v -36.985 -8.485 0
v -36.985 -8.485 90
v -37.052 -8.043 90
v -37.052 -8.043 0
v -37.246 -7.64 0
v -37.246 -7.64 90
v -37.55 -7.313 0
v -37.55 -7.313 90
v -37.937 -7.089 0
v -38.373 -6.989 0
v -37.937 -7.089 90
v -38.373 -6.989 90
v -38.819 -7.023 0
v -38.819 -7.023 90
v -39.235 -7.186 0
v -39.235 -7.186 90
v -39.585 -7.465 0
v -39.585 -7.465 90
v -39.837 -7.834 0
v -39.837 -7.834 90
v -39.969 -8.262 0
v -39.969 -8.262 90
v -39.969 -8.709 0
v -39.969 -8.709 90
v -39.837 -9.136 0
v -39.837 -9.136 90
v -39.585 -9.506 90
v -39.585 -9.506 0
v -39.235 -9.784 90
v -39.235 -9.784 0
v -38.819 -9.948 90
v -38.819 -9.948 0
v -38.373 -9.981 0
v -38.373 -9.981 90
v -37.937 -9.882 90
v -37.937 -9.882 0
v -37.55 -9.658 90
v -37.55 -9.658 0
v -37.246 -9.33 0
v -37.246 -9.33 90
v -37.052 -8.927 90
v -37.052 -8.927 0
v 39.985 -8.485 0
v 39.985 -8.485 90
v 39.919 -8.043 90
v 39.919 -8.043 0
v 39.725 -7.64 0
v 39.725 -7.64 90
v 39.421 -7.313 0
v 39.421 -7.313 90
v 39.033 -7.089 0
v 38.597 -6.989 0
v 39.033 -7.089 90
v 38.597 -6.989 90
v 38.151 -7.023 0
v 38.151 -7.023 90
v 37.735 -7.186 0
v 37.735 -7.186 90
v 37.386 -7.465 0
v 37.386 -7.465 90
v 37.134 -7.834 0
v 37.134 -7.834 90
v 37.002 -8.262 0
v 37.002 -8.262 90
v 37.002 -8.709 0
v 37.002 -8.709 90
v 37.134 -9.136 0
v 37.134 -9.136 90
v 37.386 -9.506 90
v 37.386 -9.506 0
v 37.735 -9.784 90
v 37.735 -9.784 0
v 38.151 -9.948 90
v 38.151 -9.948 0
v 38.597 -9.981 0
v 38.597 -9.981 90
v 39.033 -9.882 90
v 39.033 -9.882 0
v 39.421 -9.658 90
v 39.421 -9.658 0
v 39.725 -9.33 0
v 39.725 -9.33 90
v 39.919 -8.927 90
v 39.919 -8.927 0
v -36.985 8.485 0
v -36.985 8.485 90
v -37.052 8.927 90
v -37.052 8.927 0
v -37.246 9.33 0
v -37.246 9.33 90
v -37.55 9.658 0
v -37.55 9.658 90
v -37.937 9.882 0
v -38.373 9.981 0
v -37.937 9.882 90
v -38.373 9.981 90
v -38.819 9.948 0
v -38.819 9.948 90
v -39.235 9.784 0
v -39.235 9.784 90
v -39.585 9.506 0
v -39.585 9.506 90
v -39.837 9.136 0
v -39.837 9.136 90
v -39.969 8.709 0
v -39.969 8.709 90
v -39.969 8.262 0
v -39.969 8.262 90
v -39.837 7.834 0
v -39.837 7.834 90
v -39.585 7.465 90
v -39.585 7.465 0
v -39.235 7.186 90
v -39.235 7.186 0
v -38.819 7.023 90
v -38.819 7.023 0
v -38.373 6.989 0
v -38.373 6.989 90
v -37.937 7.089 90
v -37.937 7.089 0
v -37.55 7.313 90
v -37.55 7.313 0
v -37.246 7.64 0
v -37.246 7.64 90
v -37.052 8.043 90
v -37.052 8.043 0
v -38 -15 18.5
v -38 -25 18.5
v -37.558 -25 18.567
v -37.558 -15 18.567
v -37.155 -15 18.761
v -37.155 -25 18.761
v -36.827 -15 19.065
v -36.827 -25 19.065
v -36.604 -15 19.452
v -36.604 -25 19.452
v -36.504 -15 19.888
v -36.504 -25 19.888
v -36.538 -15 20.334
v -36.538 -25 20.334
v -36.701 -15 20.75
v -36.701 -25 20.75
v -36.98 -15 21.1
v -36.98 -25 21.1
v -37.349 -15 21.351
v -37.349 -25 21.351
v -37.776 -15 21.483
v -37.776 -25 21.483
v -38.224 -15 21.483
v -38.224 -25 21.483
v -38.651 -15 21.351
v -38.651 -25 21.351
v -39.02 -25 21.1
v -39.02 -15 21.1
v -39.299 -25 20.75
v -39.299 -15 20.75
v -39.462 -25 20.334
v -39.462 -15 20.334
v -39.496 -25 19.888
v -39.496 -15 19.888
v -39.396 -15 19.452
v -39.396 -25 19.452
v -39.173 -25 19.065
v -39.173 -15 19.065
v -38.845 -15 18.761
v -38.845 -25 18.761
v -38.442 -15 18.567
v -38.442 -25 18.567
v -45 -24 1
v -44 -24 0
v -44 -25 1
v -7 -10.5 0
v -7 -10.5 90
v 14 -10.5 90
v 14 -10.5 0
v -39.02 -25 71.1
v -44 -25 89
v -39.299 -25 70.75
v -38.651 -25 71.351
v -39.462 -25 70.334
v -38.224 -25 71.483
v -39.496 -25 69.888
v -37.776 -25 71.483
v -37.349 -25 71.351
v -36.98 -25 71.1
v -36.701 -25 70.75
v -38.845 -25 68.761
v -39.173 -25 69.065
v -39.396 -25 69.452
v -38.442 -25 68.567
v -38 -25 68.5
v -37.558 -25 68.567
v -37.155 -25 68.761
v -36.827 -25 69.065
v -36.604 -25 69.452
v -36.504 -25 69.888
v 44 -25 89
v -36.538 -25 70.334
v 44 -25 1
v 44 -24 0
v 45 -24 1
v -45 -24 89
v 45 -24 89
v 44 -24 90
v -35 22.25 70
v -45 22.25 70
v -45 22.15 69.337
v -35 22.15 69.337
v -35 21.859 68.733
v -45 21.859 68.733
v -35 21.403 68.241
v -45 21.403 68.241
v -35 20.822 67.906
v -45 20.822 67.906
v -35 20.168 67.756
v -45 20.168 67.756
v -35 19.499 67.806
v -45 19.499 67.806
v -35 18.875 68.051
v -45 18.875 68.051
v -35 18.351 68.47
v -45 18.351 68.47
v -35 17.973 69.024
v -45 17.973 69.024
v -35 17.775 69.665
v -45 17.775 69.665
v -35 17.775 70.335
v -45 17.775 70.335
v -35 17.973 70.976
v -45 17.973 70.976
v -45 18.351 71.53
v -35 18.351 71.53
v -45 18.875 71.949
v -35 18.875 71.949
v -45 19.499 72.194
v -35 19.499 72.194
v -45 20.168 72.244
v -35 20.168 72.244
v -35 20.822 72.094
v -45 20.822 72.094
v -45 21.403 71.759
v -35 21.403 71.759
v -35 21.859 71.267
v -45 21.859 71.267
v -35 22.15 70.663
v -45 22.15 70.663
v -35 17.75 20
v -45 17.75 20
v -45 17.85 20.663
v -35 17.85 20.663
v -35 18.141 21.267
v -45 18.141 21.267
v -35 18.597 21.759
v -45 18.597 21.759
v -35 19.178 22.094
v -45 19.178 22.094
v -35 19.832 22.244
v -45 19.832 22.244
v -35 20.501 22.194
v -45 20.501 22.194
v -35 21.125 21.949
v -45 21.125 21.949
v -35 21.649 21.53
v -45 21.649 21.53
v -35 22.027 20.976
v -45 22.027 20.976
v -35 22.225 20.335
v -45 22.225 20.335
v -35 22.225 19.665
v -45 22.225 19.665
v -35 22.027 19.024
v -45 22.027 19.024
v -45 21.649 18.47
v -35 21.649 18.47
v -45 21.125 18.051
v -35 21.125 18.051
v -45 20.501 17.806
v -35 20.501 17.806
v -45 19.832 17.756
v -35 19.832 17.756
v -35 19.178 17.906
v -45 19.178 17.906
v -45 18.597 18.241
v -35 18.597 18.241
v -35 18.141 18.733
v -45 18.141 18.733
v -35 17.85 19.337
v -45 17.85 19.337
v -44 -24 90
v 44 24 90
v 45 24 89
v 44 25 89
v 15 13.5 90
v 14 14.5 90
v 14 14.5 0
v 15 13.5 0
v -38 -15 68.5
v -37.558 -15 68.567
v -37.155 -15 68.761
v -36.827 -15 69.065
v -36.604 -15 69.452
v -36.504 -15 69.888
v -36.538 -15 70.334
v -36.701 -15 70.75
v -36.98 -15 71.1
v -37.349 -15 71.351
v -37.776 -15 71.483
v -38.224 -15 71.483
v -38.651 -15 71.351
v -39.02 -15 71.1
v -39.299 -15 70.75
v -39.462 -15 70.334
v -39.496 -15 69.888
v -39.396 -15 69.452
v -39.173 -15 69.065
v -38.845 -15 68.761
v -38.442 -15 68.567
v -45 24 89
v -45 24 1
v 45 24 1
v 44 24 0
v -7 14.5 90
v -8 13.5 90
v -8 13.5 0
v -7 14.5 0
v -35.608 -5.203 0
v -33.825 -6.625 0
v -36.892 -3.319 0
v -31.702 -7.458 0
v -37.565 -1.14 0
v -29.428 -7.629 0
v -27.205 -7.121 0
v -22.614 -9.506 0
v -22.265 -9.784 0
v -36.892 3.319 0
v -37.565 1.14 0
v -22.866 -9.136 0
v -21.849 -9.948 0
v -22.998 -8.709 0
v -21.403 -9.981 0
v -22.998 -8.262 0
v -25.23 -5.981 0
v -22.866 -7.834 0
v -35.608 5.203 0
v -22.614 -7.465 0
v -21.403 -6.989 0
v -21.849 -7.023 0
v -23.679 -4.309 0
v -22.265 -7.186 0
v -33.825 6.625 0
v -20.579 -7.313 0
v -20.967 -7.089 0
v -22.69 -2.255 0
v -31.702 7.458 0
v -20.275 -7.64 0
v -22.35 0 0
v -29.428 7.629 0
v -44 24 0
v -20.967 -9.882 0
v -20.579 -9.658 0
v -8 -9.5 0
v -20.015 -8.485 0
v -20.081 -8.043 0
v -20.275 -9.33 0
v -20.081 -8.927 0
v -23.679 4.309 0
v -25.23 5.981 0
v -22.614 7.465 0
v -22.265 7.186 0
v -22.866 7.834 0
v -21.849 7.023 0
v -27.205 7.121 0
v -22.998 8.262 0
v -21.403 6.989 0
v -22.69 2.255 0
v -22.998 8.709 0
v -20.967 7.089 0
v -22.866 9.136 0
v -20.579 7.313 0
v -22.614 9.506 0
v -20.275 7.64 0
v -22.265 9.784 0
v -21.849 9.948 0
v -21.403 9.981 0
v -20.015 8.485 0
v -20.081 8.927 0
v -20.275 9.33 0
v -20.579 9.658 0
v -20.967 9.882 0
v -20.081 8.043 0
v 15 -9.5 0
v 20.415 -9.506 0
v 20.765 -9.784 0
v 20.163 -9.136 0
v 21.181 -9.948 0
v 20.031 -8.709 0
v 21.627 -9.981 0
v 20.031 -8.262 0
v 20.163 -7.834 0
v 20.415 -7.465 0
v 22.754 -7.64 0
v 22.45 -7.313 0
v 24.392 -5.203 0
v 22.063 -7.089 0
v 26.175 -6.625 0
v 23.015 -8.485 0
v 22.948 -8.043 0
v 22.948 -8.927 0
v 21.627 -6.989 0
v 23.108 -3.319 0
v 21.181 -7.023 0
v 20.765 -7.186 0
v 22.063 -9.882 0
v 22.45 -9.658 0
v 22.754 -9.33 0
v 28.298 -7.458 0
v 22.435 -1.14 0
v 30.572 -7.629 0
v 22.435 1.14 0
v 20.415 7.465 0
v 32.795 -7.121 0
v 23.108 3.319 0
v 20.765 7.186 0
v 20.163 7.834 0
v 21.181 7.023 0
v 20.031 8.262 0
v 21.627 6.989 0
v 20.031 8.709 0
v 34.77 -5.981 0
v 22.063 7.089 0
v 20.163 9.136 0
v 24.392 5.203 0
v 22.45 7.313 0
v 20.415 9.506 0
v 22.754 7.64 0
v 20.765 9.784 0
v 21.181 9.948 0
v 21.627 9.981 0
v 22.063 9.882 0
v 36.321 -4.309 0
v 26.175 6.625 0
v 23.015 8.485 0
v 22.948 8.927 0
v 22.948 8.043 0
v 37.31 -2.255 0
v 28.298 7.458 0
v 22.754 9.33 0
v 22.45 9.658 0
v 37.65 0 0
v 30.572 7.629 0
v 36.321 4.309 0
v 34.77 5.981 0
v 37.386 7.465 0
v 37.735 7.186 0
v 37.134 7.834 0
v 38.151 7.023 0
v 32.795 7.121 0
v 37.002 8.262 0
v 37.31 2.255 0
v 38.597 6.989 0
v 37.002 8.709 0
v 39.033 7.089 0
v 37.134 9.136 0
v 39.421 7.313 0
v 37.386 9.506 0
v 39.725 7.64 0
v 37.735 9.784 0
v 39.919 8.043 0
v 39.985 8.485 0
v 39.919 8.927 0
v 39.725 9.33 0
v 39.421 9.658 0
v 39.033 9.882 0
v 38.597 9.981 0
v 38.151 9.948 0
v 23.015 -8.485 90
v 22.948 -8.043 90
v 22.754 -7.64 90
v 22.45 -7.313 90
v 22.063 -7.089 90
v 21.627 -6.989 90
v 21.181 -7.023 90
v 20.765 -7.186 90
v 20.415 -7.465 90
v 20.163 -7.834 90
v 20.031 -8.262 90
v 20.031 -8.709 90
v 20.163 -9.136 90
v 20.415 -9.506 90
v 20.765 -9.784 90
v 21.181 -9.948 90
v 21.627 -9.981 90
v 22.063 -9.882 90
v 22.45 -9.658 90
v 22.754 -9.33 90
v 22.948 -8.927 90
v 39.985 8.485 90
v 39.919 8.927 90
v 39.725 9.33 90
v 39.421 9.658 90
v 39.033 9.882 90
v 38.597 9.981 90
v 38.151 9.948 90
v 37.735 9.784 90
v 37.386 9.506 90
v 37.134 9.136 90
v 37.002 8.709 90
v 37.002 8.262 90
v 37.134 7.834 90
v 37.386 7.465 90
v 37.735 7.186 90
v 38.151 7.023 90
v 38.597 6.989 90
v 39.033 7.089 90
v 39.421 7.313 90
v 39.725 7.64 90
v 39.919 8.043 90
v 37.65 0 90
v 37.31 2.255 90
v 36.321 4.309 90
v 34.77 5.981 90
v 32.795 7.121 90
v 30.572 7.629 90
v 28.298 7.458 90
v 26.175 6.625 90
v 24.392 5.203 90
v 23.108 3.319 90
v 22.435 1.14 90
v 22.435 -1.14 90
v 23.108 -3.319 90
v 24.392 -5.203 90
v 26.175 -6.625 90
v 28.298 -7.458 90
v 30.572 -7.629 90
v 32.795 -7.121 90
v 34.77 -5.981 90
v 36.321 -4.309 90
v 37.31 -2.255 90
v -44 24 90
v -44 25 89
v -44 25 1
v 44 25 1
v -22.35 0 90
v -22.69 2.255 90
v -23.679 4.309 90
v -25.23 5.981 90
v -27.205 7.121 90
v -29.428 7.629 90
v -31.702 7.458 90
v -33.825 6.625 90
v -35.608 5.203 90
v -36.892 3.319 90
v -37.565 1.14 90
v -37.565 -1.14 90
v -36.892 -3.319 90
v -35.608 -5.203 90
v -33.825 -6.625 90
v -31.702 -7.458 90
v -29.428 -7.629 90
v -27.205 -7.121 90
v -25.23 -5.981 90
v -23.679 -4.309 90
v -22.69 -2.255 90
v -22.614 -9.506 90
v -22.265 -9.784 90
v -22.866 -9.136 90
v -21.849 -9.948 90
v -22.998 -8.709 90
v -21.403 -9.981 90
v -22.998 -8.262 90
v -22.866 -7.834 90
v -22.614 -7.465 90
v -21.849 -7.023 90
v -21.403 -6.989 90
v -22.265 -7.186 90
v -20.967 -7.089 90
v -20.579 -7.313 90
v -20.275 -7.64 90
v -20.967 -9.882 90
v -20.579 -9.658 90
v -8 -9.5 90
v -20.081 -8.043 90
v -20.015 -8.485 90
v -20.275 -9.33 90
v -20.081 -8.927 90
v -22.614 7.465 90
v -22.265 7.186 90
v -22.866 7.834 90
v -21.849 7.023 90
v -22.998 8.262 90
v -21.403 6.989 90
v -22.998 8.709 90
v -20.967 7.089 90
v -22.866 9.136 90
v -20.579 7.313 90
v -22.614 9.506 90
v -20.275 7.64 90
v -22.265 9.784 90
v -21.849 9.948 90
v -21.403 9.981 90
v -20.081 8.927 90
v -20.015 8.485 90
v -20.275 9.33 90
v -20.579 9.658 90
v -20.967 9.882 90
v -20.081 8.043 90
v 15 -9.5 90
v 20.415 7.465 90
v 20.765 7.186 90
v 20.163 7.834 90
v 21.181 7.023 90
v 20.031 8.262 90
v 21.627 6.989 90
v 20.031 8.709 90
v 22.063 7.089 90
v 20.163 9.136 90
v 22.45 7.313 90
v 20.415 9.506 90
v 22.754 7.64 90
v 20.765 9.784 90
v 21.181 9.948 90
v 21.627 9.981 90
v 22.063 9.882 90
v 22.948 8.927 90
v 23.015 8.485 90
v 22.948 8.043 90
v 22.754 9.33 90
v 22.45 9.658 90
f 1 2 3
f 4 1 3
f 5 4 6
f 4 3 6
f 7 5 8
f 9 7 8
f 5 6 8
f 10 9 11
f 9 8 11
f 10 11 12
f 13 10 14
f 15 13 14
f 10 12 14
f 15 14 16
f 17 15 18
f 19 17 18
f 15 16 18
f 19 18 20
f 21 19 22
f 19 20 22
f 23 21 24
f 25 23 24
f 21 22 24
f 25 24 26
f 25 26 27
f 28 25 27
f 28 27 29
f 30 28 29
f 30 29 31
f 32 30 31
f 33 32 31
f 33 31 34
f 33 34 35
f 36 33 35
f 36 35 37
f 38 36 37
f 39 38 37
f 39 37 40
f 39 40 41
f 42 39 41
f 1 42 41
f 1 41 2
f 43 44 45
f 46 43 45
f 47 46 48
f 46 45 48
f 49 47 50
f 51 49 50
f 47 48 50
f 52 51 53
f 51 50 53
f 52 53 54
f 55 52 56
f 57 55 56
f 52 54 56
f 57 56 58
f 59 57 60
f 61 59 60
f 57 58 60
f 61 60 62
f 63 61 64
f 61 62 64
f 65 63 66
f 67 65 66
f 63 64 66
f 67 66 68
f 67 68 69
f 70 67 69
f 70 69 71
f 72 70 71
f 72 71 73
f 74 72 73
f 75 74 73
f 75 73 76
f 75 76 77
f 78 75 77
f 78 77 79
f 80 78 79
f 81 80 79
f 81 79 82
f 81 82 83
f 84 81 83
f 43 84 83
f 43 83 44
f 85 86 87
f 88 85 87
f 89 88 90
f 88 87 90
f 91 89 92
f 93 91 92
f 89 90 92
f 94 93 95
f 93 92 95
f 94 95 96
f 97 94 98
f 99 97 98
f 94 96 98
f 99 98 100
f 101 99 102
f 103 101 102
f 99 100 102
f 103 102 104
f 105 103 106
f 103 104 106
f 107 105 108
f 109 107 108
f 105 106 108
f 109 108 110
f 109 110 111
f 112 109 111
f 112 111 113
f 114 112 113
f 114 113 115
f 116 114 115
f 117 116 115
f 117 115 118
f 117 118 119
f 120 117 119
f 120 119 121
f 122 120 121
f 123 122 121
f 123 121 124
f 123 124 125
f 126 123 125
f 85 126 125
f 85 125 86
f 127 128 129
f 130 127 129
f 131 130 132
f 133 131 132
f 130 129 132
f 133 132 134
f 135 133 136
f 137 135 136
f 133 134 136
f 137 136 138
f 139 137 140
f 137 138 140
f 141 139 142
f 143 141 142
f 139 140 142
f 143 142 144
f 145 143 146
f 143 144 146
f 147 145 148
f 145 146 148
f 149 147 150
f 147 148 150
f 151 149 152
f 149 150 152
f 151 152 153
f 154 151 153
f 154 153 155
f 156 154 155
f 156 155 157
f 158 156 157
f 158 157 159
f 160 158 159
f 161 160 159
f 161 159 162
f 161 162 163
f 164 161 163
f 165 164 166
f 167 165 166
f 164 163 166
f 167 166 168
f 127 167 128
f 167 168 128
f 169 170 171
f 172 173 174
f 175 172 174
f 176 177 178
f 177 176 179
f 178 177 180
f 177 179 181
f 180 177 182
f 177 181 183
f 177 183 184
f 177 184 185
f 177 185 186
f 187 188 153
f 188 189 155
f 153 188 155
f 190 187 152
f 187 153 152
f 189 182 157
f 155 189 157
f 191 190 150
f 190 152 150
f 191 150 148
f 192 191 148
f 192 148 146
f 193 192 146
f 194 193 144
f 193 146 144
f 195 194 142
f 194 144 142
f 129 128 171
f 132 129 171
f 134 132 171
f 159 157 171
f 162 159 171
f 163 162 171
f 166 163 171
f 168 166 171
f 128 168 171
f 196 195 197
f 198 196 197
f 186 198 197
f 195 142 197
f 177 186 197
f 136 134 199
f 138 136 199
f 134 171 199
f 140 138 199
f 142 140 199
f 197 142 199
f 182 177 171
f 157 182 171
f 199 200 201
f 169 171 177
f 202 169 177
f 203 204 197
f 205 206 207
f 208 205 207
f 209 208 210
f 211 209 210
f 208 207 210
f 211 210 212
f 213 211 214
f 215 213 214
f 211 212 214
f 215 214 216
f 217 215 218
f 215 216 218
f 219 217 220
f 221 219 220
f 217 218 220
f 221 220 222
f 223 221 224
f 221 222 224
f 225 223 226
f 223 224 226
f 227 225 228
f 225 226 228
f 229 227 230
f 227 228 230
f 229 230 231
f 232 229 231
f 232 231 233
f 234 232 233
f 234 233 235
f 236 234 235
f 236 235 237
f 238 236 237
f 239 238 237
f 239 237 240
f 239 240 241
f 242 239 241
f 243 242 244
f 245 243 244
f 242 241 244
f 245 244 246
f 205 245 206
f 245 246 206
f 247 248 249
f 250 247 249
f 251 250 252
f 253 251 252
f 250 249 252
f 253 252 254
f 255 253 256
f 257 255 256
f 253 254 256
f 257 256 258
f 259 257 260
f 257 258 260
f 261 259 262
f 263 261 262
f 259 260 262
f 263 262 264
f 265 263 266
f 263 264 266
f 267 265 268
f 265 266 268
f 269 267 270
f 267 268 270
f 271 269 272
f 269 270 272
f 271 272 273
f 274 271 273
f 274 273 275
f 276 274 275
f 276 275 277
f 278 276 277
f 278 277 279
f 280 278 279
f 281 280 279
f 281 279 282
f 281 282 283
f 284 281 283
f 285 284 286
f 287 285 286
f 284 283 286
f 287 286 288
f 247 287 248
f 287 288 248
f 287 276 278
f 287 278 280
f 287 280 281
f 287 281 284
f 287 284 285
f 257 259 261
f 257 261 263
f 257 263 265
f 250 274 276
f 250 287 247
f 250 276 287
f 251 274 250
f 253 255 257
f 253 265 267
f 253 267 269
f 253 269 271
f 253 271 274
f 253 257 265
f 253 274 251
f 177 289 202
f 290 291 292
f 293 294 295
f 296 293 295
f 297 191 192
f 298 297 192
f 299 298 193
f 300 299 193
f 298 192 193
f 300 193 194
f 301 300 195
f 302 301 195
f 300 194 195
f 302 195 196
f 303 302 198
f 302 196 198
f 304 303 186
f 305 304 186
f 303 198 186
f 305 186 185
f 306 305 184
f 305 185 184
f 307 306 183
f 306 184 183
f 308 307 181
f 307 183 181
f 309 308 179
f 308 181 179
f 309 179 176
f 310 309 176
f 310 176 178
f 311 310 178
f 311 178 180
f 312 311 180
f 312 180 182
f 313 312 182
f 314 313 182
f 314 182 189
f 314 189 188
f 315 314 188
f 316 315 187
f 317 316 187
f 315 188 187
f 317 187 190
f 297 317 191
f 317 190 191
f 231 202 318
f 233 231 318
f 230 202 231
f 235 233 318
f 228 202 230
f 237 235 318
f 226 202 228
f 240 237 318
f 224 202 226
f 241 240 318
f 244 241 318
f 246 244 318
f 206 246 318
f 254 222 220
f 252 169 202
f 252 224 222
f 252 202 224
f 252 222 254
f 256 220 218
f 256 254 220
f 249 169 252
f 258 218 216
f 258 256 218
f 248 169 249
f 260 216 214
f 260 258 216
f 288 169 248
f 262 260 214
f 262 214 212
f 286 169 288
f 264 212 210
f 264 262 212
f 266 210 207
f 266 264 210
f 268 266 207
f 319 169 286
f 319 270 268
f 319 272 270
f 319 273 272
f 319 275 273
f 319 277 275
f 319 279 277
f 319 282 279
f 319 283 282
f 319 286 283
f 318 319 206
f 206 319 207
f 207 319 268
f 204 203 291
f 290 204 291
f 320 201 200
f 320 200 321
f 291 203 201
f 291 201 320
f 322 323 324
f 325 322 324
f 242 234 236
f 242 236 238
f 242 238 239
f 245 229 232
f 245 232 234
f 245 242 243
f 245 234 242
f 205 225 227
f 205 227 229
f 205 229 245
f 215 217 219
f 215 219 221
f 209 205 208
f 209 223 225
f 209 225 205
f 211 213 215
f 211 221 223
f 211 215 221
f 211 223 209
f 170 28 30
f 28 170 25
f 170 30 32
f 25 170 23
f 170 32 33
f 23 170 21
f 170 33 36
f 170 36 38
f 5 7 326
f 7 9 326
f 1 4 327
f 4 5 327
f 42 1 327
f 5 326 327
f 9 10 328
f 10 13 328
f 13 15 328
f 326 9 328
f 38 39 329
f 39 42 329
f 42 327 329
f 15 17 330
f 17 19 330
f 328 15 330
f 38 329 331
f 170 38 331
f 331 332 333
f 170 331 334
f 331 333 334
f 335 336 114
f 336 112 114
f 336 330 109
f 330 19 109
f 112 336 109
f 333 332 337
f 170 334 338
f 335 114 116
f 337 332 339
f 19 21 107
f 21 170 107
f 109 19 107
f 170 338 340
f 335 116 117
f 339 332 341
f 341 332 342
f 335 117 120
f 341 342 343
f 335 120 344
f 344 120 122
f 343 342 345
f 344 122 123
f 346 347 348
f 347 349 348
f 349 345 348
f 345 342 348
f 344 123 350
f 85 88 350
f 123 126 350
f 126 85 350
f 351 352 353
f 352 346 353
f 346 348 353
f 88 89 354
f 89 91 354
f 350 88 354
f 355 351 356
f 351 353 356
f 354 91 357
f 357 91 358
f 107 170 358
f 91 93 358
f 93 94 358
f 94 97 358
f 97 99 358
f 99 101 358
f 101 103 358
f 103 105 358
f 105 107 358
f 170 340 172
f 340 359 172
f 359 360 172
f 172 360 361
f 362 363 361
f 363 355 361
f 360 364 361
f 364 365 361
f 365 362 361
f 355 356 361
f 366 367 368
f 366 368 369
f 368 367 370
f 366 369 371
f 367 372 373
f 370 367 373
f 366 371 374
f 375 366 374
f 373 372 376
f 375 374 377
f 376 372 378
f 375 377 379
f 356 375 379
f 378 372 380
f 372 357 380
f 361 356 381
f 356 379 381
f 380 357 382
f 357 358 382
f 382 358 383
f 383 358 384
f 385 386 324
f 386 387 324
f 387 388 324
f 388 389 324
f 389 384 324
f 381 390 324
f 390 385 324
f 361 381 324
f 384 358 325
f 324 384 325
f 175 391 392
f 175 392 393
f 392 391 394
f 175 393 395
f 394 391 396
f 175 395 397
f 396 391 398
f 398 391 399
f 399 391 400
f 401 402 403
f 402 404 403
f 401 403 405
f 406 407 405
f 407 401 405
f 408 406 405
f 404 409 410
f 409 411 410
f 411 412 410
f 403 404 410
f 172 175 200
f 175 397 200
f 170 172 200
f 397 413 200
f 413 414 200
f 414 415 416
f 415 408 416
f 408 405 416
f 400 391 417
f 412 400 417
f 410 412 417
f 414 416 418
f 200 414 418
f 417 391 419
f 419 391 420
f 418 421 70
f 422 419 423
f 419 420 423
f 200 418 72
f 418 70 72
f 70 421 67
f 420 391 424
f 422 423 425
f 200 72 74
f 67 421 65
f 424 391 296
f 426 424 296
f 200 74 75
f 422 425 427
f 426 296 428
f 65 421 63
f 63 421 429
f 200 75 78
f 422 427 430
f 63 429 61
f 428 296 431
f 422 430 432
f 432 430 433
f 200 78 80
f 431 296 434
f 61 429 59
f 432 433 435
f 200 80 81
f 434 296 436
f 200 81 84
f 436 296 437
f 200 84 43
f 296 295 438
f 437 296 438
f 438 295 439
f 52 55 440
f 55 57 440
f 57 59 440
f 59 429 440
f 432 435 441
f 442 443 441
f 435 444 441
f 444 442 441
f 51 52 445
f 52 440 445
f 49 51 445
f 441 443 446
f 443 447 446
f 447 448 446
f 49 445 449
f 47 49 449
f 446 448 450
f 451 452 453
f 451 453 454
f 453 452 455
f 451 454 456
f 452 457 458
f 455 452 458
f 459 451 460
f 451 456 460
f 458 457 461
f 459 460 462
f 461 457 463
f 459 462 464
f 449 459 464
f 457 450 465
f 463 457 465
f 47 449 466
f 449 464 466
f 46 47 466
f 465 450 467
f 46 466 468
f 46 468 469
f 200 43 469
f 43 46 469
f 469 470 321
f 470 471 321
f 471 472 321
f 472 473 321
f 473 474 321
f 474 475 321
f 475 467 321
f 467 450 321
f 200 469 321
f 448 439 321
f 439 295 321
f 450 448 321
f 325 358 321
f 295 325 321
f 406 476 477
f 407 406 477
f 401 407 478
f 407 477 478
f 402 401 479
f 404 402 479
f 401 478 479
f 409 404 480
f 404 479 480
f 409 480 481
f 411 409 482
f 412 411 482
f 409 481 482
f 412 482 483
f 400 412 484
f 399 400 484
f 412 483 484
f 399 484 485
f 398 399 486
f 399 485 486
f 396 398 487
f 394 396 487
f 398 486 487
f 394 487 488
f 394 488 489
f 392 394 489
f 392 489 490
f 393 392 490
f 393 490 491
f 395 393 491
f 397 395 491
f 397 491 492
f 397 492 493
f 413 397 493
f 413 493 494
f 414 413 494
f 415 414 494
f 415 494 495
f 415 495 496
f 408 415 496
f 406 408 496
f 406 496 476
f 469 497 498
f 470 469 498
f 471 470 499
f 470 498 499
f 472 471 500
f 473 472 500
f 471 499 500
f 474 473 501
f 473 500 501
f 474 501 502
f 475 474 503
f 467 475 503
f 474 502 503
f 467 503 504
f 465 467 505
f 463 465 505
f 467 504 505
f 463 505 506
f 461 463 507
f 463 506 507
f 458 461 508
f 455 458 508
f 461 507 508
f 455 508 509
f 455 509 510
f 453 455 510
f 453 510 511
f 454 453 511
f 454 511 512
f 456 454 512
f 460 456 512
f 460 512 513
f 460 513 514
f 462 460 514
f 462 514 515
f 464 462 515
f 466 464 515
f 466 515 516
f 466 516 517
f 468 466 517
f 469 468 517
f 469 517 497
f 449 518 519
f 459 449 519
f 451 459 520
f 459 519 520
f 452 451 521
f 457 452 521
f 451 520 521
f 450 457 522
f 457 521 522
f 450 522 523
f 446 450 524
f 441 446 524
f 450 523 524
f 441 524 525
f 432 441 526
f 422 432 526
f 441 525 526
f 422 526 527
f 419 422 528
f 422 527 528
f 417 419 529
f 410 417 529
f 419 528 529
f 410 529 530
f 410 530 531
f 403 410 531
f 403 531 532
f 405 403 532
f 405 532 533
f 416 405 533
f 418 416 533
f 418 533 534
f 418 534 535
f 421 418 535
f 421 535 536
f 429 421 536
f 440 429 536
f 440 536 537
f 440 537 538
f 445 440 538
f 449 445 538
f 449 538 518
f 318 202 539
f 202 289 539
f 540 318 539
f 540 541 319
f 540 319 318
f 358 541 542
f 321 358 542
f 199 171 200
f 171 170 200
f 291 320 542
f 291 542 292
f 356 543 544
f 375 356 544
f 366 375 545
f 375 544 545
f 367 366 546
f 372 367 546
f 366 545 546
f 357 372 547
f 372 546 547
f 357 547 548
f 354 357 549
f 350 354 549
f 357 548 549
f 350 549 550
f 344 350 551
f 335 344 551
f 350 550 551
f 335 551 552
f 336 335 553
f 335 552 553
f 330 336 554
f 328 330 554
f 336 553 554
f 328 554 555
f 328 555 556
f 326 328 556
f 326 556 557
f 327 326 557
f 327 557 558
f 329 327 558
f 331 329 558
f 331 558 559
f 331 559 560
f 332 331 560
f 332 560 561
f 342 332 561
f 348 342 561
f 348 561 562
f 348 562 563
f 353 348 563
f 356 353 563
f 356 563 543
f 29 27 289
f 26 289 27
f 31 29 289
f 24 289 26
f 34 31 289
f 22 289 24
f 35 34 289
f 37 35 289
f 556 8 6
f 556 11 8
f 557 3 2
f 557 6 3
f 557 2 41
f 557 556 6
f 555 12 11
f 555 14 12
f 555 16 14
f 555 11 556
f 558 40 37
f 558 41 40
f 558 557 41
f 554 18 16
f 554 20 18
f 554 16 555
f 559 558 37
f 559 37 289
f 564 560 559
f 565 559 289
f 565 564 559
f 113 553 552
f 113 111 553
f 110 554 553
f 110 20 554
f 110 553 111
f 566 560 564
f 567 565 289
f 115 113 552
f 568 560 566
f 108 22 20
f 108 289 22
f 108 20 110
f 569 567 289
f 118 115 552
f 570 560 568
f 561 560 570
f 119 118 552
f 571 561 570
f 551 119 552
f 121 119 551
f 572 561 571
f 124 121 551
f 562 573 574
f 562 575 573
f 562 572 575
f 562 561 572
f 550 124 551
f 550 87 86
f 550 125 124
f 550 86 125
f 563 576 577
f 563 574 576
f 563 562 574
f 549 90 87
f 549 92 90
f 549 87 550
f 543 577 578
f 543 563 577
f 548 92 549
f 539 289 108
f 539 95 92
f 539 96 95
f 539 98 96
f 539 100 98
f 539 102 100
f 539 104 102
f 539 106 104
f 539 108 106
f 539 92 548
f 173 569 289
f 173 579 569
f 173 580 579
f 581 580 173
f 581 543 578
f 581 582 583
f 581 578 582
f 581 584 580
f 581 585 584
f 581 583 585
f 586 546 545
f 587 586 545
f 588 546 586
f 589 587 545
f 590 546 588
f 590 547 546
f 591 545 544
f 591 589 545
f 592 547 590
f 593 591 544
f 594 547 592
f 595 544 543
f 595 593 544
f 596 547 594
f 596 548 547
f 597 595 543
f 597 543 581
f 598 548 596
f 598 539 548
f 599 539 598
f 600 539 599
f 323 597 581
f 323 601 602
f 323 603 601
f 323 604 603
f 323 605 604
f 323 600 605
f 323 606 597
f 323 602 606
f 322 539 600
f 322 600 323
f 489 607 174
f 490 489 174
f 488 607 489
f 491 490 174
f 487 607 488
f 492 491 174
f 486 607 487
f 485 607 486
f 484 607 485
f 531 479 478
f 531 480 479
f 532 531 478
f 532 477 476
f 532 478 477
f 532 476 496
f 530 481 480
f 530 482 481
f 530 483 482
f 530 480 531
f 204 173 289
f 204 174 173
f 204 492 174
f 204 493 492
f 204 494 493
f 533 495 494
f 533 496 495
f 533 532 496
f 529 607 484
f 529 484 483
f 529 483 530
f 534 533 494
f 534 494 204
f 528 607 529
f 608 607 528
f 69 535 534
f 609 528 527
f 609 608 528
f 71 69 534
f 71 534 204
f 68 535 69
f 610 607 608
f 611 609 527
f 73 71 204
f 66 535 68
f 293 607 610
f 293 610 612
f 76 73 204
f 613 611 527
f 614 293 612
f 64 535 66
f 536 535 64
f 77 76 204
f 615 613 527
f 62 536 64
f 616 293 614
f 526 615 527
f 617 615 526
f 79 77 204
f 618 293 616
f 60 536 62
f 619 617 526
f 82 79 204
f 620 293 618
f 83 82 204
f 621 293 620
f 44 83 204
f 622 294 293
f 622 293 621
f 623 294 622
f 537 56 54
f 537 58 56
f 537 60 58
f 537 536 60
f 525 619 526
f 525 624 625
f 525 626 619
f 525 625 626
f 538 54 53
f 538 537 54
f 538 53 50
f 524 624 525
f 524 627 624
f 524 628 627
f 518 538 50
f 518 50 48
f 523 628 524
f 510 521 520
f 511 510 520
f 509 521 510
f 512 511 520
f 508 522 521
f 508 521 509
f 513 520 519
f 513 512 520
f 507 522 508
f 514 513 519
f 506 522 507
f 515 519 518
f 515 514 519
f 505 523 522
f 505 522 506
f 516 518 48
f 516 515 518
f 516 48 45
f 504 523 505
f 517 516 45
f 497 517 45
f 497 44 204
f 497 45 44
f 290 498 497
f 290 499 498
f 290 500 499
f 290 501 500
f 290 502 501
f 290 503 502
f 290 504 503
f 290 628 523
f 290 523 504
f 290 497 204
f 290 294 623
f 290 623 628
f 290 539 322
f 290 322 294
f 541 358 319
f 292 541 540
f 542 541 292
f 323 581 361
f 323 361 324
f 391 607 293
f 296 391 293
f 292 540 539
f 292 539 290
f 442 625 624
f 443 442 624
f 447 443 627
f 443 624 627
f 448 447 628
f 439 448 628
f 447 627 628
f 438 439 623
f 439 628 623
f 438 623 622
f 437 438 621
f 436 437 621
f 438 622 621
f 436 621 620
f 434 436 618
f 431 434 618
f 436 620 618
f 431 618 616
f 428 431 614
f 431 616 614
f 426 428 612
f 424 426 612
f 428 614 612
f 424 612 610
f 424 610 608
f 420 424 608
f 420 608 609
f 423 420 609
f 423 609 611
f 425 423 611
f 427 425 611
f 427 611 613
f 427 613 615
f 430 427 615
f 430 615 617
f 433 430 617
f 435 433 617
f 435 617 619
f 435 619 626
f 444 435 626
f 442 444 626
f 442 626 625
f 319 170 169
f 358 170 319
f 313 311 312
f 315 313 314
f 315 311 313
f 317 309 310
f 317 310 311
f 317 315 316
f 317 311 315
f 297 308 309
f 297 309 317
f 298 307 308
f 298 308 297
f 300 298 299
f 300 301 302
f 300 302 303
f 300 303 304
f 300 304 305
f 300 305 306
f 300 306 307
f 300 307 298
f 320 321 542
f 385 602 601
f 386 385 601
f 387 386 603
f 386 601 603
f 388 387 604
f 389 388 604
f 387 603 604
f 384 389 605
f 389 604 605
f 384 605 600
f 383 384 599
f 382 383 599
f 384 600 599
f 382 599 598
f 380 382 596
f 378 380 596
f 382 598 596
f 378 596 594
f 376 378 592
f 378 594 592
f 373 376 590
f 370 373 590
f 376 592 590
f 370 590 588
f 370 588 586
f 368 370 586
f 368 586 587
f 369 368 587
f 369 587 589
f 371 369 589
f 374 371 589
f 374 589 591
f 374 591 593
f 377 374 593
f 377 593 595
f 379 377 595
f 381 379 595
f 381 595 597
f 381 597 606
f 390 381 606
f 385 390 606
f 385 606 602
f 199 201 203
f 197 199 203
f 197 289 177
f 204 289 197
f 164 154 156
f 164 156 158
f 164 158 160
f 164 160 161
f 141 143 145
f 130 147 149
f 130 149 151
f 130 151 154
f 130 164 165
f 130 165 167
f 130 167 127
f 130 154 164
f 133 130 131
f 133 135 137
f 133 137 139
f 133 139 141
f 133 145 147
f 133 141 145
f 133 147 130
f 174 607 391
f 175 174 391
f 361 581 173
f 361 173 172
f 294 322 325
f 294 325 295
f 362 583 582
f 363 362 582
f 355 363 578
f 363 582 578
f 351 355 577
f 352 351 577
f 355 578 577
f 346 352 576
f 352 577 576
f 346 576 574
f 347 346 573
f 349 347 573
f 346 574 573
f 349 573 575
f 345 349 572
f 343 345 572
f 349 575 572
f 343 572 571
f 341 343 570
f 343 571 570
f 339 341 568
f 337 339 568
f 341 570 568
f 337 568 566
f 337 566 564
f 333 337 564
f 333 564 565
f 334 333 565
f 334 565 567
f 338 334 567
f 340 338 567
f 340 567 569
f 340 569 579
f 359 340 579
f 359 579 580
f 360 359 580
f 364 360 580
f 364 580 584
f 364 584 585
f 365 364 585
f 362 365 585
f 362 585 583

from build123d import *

# Parameters (mm, degrees)
SKETCH1_W           = 90
SKETCH1_H           = 50
BOSS_EXTRUDE1_DEPTH = 90
SKETCH2_R           = 7.65
CUT_EXTRUDE1_DEPTH  = 104.682206767
SKETCH3_R           = 2.25
CUT_EXTRUDE2_DEPTH  = 10
SKETCH4_R           = 1.5
CUT_EXTRUDE3_DEPTH  = 10
SKETCH5_R           = 1.5
CUT_EXTRUDE4_DEPTH  = 104.682206767
CHAMFER1_SIZE       = 1
SKETCH6_W           = 23
SKETCH6_H           = 25
CUT_EXTRUDE5_DEPTH  = 104.682206767
CHAMFER2_SIZE       = 1


with BuildPart() as part:
    # Sketch1 → Boss-Extrude1 (new body)
    with BuildSketch(Plane.XY):
        Rectangle(SKETCH1_W, SKETCH1_H)
    extrude(amount=BOSS_EXTRUDE1_DEPTH)

    # Sketch2 → Cut-Extrude1 (cut, through all)
    with BuildSketch(Plane.XY.offset(90)):
        with Locations((-30, 0)):
            Circle(SKETCH2_R)
        with Locations((30, 0)):
            Circle(SKETCH2_R)
    extrude(amount=-CUT_EXTRUDE1_DEPTH, mode=Mode.SUBTRACT)

    # Sketch3 → Cut-Extrude2 (cut)
    with BuildSketch(Plane.ZY.offset(45)):
        with Locations(Location((20, 20, 0), (0, 0, 270))):
            Circle(SKETCH3_R)
        with Locations(Location((70, 20, 0), (0, 0, 90))):
            Circle(SKETCH3_R)
    extrude(amount=-CUT_EXTRUDE2_DEPTH, mode=Mode.SUBTRACT)

    # Sketch4 → Cut-Extrude3 (cut)
    with BuildSketch(Plane.XZ.offset(25)):
        with Locations(Location((-38, 70, 0), (0, 0, 270))):
            Circle(SKETCH4_R)
        with Locations(Location((-38, 20, 0), (0, 0, 270))):
            Circle(SKETCH4_R)
    extrude(amount=-CUT_EXTRUDE3_DEPTH, mode=Mode.SUBTRACT)

    # Sketch5 → Cut-Extrude4 (cut, through all)
    with BuildSketch(Plane.XY.offset(90)):
        with Locations((-38.485281374, 8.485281374)):
            Circle(SKETCH5_R)
        with Locations((-21.514718626, 8.485281374)):
            Circle(SKETCH5_R)
        with Locations((-21.514718626, -8.485281374)):
            Circle(SKETCH5_R)
        with Locations((-38.485281374, -8.485281374)):
            Circle(SKETCH5_R)
        with Locations((38.485281374, -8.485281374)):
            Circle(SKETCH5_R)
        with Locations((21.514718626, -8.485281374)):
            Circle(SKETCH5_R)
        with Locations((21.514718626, 8.485281374)):
            Circle(SKETCH5_R)
        with Locations((38.485281374, 8.485281374)):
            Circle(SKETCH5_R)
    extrude(amount=-CUT_EXTRUDE4_DEPTH, mode=Mode.SUBTRACT)

    # Chamfer1
    chamfer1_edges = [part.edges().sort_by_distance(p)[0] for p in [
        (-45, 0, 90),
        (0, -25, 90),
        (45, 0, 90),
        (0, -25, 0),
        (-45, 0, 0),
        (0, 25, 0),
        (45, 0, 0),
        (45, -25, 45),
        (-45, -25, 45),
        (-45, 25, 45),
        (45, 25, 45),
        (0, 25, 90),
    ]]
    chamfer(chamfer1_edges, length=CHAMFER1_SIZE)

    # Sketch6 → Cut-Extrude5 (cut, through all)
    with BuildSketch(Plane.XY.offset(90)):
        with Locations((3.5, 2)):
            Rectangle(SKETCH6_W, SKETCH6_H)
    extrude(amount=-CUT_EXTRUDE5_DEPTH, mode=Mode.SUBTRACT)

    # Chamfer2
    chamfer2_edges = [part.edges().sort_by_distance(p)[0] for p in [
        (15, 14.5, 45),
        (15, -10.5, 45),
        (-8, -10.5, 45),
        (-8, 14.5, 45),
    ]]
    chamfer(chamfer2_edges, length=CHAMFER2_SIZE)


solid = part.part
